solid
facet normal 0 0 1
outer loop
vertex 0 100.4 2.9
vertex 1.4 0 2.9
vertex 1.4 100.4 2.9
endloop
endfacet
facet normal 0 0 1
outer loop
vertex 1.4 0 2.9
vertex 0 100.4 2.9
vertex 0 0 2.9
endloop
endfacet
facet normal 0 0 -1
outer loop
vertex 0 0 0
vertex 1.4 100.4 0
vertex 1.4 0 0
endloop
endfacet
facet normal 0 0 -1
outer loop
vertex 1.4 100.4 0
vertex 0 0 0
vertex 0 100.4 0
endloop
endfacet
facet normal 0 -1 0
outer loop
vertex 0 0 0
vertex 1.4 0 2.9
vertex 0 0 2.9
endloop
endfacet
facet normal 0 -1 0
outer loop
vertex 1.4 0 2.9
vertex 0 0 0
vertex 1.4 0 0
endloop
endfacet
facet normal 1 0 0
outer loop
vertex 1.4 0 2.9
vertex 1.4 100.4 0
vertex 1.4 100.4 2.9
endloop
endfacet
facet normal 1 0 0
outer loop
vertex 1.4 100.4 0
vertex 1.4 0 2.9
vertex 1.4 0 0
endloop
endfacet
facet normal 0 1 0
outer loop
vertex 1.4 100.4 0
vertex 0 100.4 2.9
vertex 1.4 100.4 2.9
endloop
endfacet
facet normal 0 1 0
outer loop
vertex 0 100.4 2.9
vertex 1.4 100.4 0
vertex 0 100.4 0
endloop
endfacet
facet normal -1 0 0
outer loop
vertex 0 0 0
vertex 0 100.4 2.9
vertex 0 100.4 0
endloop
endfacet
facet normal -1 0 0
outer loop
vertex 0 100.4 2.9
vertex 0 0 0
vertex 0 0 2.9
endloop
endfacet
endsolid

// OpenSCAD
function ZipTieWidth(3dPrinterTolerance=.4)=2.5+3dPrinterTolerance;
function ZipTieHeight(3dPrinterTolerance=.4)=1+3dPrinterTolerance;
function ZipTieLength(3dPrinterTolerance=.4)=100+3dPrinterTolerance;

module ZipTie(3dPrinterTolerance=.4)
{
	cube([ZipTieHeight(3dPrinterTolerance),ZipTieLength(3dPrinterTolerance), ZipTieWidth(3dPrinterTolerance)]);
}

ZipTie(.4);
